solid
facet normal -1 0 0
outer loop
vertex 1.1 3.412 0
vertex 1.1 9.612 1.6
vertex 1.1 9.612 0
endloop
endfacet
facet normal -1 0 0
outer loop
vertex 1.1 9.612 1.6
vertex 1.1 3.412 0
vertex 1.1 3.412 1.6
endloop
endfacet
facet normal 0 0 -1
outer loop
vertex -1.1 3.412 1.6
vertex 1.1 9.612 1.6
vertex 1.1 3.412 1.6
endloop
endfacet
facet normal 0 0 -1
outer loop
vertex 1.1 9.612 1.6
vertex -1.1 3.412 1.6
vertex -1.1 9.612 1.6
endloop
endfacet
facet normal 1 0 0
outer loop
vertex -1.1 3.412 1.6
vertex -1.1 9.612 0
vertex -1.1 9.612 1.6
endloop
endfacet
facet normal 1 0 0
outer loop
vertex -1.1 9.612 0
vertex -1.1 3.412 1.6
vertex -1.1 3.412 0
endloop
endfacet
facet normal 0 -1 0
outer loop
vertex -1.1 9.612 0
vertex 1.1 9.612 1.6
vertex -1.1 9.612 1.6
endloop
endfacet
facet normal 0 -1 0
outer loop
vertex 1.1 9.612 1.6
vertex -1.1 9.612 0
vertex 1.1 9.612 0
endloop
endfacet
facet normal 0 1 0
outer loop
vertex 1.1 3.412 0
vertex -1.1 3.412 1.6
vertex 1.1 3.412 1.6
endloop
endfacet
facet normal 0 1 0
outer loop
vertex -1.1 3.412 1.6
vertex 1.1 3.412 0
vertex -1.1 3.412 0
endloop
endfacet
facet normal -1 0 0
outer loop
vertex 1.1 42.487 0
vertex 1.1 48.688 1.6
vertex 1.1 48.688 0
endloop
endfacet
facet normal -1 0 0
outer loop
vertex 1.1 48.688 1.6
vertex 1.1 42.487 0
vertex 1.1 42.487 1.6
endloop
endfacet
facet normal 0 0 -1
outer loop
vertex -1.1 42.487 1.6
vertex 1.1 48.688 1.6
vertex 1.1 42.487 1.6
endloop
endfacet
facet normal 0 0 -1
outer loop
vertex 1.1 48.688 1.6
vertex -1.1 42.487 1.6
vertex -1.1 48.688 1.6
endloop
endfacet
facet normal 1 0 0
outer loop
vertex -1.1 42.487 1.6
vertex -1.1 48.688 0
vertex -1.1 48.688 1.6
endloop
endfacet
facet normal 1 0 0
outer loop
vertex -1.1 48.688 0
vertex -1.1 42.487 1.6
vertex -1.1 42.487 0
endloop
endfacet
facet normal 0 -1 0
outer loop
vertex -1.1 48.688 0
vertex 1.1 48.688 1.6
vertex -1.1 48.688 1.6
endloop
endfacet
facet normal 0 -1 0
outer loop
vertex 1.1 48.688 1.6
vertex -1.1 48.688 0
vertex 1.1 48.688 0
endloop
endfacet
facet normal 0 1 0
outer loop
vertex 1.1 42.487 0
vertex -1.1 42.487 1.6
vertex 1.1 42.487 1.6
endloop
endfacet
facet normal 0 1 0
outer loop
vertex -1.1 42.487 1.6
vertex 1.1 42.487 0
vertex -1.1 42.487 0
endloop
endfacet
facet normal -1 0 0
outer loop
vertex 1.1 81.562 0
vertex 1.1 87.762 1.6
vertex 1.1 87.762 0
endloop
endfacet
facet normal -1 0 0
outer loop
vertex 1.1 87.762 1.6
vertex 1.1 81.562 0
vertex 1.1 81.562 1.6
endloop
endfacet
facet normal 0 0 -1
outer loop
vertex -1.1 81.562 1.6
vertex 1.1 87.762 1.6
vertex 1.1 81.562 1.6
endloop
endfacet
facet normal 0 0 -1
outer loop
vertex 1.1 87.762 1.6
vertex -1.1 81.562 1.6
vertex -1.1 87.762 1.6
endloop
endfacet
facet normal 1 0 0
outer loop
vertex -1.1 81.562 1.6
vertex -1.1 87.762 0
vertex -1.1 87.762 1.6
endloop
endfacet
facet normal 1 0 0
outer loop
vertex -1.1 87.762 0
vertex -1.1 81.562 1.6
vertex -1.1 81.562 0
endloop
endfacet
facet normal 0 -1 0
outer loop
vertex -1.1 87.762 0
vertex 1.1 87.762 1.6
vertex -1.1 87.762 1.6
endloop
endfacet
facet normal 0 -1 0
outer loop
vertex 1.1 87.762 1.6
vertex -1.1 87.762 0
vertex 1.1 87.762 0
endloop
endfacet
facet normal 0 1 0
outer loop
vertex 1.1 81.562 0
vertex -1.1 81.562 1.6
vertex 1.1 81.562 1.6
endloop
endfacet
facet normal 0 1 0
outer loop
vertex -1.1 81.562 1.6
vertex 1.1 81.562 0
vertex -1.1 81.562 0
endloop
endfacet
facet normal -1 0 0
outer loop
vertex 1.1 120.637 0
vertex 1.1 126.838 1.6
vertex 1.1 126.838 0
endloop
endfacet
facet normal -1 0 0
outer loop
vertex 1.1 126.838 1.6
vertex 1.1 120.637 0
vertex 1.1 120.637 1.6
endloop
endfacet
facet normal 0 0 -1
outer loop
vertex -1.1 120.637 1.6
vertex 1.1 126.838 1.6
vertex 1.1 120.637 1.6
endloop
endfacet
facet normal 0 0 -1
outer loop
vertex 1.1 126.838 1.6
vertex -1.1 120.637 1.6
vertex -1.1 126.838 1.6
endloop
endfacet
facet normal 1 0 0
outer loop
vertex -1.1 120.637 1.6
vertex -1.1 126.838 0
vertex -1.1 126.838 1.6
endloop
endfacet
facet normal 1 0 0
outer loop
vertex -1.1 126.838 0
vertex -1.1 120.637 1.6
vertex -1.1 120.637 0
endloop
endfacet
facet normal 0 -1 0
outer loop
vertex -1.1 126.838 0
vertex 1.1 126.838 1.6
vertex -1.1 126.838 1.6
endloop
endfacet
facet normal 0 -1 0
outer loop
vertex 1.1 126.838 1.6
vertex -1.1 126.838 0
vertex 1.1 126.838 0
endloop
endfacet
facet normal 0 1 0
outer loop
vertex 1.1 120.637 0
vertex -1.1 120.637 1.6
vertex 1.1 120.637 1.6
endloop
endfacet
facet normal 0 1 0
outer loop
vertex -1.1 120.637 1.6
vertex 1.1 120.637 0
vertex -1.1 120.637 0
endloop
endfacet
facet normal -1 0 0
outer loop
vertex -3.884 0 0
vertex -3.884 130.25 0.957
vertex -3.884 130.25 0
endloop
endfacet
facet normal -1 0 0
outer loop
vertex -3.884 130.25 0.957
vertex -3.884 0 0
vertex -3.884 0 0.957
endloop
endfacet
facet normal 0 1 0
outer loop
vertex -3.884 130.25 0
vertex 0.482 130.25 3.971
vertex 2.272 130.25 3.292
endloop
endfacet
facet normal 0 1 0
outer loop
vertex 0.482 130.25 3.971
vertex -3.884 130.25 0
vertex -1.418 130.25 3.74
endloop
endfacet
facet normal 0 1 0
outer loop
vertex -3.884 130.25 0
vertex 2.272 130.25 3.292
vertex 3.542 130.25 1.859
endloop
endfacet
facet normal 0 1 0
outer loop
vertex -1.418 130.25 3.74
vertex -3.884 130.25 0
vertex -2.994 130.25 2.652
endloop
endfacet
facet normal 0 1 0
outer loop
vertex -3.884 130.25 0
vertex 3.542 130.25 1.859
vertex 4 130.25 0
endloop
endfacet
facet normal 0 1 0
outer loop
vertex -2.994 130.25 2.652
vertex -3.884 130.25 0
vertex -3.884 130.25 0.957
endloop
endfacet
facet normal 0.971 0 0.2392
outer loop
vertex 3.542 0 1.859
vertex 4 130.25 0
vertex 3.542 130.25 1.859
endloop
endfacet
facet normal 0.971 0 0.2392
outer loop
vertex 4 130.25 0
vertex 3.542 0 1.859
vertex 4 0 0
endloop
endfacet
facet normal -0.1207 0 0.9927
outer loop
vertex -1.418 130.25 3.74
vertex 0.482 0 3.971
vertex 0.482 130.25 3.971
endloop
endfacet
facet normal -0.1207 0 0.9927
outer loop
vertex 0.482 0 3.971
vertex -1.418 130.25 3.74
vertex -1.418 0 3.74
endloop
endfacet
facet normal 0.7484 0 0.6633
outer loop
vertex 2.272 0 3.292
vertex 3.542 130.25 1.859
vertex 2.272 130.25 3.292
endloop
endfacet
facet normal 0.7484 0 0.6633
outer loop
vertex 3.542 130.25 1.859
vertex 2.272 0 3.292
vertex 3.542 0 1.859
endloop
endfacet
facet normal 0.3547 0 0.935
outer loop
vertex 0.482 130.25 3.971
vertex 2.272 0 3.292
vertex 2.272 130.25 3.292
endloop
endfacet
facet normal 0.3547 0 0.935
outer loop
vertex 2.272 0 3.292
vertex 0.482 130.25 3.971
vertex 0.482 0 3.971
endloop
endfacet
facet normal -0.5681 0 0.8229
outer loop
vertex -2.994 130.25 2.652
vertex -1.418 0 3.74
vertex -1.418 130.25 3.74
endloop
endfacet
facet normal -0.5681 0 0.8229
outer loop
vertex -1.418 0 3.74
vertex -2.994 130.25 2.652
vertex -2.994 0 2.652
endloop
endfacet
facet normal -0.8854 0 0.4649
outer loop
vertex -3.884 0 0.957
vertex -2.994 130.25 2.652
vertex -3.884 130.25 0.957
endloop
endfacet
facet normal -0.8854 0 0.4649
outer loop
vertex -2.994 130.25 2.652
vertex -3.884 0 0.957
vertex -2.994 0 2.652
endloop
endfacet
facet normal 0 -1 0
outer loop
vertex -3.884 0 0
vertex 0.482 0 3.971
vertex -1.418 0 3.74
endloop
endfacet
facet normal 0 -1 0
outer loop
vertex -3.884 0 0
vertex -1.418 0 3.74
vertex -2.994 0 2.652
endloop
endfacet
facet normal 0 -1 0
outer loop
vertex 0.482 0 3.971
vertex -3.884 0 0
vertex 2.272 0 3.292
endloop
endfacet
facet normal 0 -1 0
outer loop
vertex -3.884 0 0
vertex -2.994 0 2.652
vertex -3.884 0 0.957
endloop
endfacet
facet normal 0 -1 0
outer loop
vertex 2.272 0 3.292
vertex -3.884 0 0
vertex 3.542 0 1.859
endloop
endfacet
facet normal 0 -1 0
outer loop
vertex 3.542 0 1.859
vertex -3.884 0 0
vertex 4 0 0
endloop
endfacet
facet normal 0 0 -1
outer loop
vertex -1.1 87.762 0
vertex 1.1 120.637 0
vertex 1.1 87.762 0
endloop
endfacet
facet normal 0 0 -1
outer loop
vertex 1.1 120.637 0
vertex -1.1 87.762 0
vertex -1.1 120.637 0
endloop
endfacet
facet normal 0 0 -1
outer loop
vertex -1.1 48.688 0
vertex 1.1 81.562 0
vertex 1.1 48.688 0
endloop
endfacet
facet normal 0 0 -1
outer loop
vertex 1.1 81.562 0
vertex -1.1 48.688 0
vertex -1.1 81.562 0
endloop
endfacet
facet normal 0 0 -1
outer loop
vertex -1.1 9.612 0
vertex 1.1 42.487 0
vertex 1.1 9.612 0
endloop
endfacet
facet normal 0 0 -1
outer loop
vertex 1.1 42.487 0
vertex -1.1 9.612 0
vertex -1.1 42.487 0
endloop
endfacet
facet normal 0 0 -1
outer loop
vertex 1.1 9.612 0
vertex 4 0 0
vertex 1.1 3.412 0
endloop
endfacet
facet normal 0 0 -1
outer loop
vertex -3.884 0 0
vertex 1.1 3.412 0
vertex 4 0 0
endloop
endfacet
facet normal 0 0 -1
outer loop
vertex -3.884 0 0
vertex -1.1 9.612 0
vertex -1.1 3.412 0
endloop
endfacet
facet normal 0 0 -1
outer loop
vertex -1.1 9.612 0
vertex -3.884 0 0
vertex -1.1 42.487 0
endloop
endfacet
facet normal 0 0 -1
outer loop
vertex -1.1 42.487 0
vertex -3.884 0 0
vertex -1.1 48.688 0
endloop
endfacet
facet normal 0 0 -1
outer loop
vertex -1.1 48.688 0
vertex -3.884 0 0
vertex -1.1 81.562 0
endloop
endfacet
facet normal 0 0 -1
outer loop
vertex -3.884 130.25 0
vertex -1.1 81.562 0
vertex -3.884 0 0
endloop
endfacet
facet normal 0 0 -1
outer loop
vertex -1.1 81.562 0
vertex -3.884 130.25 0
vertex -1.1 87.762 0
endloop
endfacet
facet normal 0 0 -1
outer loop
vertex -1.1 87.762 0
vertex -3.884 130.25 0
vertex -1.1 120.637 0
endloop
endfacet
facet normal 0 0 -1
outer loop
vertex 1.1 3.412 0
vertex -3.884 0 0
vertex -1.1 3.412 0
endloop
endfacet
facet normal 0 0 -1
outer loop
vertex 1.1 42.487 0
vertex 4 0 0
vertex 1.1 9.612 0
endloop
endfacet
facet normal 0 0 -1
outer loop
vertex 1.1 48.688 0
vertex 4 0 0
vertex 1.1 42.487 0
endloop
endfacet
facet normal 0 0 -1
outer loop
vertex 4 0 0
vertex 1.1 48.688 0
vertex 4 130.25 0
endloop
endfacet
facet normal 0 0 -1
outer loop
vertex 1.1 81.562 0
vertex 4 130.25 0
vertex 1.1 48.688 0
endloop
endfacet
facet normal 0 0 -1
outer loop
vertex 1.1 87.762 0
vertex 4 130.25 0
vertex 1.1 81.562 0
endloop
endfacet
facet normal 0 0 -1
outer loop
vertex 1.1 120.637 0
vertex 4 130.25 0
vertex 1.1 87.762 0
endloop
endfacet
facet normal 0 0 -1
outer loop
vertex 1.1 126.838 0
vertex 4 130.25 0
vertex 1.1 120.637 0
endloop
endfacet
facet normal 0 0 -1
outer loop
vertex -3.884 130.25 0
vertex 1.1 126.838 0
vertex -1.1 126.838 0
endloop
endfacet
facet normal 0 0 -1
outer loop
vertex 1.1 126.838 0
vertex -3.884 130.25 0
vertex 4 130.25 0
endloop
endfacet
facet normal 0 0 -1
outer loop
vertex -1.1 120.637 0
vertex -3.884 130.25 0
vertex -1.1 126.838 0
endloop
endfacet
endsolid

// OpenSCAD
// file: wall-commons.scad
include <carousel-config.scad>;

FX = FACE_WIDTH/2;
FY = FACE_HEIGHT;
FF = 0.85;

BEAM_SIZE = 1.1 * FACE_THICKNESS;

STRUT_OVERRUN = 0.25 * FACE_THICKNESS;

STRUTS_COLOR = "SaddleBrown";

// for mounting struts on core
STRUT_DZ = FACE_THICKNESS/2 + STRUT_OVERRUN + EASE;

module door_shape(width, height, thickness, ground_bleed = 0) {
    radius = width/2;
    straight_height = height - radius;

    translate([0, straight_height, 0])
        cylinder(h = thickness, r = radius, center = true);
    translate([0, (straight_height - ground_bleed)/2, 0])
        cube([width, straight_height + ground_bleed, thickness], center = true);
}
// file: carousel-config.scad
// ----------------------------------------------------------------------------
// Configuration of the carousel and its components.
//
// All the values beyod "---- derived" string in each of the sections should
// not be modified manually, as they are derived from the previously defined
// parameters in some way...
// ----------------------------------------------------------------------------

// Generic parameters to address consistency & interconnections of parts.
CYL_FN = 32; // BEWARE!!! set to +- 256 for STL export!
BLEED = 0.5; // overlap for union & difference operations
EASE = 0.2; // socket/pin ease for interconnecting of parts & holes

// Core defining shape of our carousel is N-faced cylinder.
// This affects most of the subsequent parameter definitions & usage.
CAROUSEL_FACE_COUNT = 6;
CAROUSEL_ESCRIBED_RADIUS = 120;
// ---- derived
CAROUSEL_INSCRIBED_RADIUS = CAROUSEL_ESCRIBED_RADIUS * cos(180/CAROUSEL_FACE_COUNT);

// Base of the carousel -> stand that holds the axle, walls, etc.
BASE_TOTAL_HEIGHT = 24;
BASE_FLOOR_THICKNESS = 4;
BASE_WALL_THICKNESS = 4;

// Face, or, a wall of the carousel "shell".
FACE_HEIGHT = 150;
FACE_THICKNESS = 5;
// ---- derived
FACE_WIDTH = CAROUSEL_ESCRIBED_RADIUS * 2 * sin(180/CAROUSEL_FACE_COUNT);
FACE_ANGLE = (1 - 2/CAROUSEL_FACE_COUNT)*180;
FACE_APOTHEM_LEN = FACE_WIDTH / (2 * tan(180/CAROUSEL_FACE_COUNT));
FACE_DOOR_HEIGHT = 0.66 * FACE_HEIGHT;
FACE_DOOR_WIDTH = 0.75 * FACE_WIDTH;

// Roof of the carousel.
ROOF_THICKNESS = 2;
ROOF_HEIGHT = 1.3 * FACE_HEIGHT;

// Ball bearing - real-life dimensions of ball bearing used to "power" the axle.
BEARING_OUTER_D = 22;
BEARING_INNER_D = 8;
BEARING_HEIGHT = 7;
BEARING_SHELL_THICKNESS = 2;

// Axle rotating inside carousel.
AXLE_RADIUS = 4;

// Rotating rig carrying the seats.
RIG_HEIGHT = 6;
RIG_STR = 6;

// Abstract "rings" carrying seats, and their distance off the carousel center
// as a fraction of radius.
RIG_RING_POSITIONS = [0.3, 0.6, 0.9];
RIG_MAX_R = 0.90 * CAROUSEL_INSCRIBED_RADIUS;
// main file
include <carousel-config.scad>;
include <wall-commons.scad>;

_COLUMN_SIZE = FF * FY + BEAM_SIZE/2;
_COLUMN_DIAM = BEAM_SIZE + 2 * STRUT_OVERRUN;

module carousel_wall_column(diam_bleed = 0, ground_bleed = 0) {
    color(STRUTS_COLOR)
    rotate([-90, 0, 0])
    translate([0, 0, -ground_bleed])
        cylinder(h = _COLUMN_SIZE + ground_bleed, d = _COLUMN_DIAM + diam_bleed);
}

module columns_side_holes() {
    translate([-FX, 0, 0])
        carousel_wall_column(diam_bleed = EASE, ground_bleed = BLEED);
    translate([FX, 0, 0])
        carousel_wall_column(diam_bleed = EASE, ground_bleed = BLEED);
}

JOINT_DIMENSIONS = [0.25 * _COLUMN_DIAM, 0.75 * _COLUMN_DIAM, 0.25 * _COLUMN_DIAM];

module carousel_wall_column_half() {
    joint_y_pos = [0.05, 0.35, 0.65, 0.95];

    cutoff_width = _COLUMN_DIAM + BLEED;
    cutoff_length = _COLUMN_SIZE + BLEED;
    cuttof_height = _COLUMN_DIAM/2 + BLEED;

    color(STRUTS_COLOR)
    difference() {
        carousel_wall_column();
        // remove bottom half of column
        translate([0,  cutoff_length/2 - BLEED/2, -cuttof_height/2])
            cube([cutoff_width, cutoff_length, cuttof_height], center = true);
        // and make holes for inter-connecting pegs
        for (fy = joint_y_pos) {
            translate([0, fy * _COLUMN_SIZE, JOINT_DIMENSIONS.z/2 - BLEED])
                cube([JOINT_DIMENSIONS.x + EASE, JOINT_DIMENSIONS.y + EASE, JOINT_DIMENSIONS.z + EASE], center = true);
        }
    }
}

module carousel_wall_column_peg() {
    x = 2 * JOINT_DIMENSIONS.z;
    y = JOINT_DIMENSIONS.y;
    z = JOINT_DIMENSIONS.x;

    color(STRUTS_COLOR)
    translate([0, 0, z/2])
    cube([x, y, z], center = true);
}

carousel_wall_column_half();
